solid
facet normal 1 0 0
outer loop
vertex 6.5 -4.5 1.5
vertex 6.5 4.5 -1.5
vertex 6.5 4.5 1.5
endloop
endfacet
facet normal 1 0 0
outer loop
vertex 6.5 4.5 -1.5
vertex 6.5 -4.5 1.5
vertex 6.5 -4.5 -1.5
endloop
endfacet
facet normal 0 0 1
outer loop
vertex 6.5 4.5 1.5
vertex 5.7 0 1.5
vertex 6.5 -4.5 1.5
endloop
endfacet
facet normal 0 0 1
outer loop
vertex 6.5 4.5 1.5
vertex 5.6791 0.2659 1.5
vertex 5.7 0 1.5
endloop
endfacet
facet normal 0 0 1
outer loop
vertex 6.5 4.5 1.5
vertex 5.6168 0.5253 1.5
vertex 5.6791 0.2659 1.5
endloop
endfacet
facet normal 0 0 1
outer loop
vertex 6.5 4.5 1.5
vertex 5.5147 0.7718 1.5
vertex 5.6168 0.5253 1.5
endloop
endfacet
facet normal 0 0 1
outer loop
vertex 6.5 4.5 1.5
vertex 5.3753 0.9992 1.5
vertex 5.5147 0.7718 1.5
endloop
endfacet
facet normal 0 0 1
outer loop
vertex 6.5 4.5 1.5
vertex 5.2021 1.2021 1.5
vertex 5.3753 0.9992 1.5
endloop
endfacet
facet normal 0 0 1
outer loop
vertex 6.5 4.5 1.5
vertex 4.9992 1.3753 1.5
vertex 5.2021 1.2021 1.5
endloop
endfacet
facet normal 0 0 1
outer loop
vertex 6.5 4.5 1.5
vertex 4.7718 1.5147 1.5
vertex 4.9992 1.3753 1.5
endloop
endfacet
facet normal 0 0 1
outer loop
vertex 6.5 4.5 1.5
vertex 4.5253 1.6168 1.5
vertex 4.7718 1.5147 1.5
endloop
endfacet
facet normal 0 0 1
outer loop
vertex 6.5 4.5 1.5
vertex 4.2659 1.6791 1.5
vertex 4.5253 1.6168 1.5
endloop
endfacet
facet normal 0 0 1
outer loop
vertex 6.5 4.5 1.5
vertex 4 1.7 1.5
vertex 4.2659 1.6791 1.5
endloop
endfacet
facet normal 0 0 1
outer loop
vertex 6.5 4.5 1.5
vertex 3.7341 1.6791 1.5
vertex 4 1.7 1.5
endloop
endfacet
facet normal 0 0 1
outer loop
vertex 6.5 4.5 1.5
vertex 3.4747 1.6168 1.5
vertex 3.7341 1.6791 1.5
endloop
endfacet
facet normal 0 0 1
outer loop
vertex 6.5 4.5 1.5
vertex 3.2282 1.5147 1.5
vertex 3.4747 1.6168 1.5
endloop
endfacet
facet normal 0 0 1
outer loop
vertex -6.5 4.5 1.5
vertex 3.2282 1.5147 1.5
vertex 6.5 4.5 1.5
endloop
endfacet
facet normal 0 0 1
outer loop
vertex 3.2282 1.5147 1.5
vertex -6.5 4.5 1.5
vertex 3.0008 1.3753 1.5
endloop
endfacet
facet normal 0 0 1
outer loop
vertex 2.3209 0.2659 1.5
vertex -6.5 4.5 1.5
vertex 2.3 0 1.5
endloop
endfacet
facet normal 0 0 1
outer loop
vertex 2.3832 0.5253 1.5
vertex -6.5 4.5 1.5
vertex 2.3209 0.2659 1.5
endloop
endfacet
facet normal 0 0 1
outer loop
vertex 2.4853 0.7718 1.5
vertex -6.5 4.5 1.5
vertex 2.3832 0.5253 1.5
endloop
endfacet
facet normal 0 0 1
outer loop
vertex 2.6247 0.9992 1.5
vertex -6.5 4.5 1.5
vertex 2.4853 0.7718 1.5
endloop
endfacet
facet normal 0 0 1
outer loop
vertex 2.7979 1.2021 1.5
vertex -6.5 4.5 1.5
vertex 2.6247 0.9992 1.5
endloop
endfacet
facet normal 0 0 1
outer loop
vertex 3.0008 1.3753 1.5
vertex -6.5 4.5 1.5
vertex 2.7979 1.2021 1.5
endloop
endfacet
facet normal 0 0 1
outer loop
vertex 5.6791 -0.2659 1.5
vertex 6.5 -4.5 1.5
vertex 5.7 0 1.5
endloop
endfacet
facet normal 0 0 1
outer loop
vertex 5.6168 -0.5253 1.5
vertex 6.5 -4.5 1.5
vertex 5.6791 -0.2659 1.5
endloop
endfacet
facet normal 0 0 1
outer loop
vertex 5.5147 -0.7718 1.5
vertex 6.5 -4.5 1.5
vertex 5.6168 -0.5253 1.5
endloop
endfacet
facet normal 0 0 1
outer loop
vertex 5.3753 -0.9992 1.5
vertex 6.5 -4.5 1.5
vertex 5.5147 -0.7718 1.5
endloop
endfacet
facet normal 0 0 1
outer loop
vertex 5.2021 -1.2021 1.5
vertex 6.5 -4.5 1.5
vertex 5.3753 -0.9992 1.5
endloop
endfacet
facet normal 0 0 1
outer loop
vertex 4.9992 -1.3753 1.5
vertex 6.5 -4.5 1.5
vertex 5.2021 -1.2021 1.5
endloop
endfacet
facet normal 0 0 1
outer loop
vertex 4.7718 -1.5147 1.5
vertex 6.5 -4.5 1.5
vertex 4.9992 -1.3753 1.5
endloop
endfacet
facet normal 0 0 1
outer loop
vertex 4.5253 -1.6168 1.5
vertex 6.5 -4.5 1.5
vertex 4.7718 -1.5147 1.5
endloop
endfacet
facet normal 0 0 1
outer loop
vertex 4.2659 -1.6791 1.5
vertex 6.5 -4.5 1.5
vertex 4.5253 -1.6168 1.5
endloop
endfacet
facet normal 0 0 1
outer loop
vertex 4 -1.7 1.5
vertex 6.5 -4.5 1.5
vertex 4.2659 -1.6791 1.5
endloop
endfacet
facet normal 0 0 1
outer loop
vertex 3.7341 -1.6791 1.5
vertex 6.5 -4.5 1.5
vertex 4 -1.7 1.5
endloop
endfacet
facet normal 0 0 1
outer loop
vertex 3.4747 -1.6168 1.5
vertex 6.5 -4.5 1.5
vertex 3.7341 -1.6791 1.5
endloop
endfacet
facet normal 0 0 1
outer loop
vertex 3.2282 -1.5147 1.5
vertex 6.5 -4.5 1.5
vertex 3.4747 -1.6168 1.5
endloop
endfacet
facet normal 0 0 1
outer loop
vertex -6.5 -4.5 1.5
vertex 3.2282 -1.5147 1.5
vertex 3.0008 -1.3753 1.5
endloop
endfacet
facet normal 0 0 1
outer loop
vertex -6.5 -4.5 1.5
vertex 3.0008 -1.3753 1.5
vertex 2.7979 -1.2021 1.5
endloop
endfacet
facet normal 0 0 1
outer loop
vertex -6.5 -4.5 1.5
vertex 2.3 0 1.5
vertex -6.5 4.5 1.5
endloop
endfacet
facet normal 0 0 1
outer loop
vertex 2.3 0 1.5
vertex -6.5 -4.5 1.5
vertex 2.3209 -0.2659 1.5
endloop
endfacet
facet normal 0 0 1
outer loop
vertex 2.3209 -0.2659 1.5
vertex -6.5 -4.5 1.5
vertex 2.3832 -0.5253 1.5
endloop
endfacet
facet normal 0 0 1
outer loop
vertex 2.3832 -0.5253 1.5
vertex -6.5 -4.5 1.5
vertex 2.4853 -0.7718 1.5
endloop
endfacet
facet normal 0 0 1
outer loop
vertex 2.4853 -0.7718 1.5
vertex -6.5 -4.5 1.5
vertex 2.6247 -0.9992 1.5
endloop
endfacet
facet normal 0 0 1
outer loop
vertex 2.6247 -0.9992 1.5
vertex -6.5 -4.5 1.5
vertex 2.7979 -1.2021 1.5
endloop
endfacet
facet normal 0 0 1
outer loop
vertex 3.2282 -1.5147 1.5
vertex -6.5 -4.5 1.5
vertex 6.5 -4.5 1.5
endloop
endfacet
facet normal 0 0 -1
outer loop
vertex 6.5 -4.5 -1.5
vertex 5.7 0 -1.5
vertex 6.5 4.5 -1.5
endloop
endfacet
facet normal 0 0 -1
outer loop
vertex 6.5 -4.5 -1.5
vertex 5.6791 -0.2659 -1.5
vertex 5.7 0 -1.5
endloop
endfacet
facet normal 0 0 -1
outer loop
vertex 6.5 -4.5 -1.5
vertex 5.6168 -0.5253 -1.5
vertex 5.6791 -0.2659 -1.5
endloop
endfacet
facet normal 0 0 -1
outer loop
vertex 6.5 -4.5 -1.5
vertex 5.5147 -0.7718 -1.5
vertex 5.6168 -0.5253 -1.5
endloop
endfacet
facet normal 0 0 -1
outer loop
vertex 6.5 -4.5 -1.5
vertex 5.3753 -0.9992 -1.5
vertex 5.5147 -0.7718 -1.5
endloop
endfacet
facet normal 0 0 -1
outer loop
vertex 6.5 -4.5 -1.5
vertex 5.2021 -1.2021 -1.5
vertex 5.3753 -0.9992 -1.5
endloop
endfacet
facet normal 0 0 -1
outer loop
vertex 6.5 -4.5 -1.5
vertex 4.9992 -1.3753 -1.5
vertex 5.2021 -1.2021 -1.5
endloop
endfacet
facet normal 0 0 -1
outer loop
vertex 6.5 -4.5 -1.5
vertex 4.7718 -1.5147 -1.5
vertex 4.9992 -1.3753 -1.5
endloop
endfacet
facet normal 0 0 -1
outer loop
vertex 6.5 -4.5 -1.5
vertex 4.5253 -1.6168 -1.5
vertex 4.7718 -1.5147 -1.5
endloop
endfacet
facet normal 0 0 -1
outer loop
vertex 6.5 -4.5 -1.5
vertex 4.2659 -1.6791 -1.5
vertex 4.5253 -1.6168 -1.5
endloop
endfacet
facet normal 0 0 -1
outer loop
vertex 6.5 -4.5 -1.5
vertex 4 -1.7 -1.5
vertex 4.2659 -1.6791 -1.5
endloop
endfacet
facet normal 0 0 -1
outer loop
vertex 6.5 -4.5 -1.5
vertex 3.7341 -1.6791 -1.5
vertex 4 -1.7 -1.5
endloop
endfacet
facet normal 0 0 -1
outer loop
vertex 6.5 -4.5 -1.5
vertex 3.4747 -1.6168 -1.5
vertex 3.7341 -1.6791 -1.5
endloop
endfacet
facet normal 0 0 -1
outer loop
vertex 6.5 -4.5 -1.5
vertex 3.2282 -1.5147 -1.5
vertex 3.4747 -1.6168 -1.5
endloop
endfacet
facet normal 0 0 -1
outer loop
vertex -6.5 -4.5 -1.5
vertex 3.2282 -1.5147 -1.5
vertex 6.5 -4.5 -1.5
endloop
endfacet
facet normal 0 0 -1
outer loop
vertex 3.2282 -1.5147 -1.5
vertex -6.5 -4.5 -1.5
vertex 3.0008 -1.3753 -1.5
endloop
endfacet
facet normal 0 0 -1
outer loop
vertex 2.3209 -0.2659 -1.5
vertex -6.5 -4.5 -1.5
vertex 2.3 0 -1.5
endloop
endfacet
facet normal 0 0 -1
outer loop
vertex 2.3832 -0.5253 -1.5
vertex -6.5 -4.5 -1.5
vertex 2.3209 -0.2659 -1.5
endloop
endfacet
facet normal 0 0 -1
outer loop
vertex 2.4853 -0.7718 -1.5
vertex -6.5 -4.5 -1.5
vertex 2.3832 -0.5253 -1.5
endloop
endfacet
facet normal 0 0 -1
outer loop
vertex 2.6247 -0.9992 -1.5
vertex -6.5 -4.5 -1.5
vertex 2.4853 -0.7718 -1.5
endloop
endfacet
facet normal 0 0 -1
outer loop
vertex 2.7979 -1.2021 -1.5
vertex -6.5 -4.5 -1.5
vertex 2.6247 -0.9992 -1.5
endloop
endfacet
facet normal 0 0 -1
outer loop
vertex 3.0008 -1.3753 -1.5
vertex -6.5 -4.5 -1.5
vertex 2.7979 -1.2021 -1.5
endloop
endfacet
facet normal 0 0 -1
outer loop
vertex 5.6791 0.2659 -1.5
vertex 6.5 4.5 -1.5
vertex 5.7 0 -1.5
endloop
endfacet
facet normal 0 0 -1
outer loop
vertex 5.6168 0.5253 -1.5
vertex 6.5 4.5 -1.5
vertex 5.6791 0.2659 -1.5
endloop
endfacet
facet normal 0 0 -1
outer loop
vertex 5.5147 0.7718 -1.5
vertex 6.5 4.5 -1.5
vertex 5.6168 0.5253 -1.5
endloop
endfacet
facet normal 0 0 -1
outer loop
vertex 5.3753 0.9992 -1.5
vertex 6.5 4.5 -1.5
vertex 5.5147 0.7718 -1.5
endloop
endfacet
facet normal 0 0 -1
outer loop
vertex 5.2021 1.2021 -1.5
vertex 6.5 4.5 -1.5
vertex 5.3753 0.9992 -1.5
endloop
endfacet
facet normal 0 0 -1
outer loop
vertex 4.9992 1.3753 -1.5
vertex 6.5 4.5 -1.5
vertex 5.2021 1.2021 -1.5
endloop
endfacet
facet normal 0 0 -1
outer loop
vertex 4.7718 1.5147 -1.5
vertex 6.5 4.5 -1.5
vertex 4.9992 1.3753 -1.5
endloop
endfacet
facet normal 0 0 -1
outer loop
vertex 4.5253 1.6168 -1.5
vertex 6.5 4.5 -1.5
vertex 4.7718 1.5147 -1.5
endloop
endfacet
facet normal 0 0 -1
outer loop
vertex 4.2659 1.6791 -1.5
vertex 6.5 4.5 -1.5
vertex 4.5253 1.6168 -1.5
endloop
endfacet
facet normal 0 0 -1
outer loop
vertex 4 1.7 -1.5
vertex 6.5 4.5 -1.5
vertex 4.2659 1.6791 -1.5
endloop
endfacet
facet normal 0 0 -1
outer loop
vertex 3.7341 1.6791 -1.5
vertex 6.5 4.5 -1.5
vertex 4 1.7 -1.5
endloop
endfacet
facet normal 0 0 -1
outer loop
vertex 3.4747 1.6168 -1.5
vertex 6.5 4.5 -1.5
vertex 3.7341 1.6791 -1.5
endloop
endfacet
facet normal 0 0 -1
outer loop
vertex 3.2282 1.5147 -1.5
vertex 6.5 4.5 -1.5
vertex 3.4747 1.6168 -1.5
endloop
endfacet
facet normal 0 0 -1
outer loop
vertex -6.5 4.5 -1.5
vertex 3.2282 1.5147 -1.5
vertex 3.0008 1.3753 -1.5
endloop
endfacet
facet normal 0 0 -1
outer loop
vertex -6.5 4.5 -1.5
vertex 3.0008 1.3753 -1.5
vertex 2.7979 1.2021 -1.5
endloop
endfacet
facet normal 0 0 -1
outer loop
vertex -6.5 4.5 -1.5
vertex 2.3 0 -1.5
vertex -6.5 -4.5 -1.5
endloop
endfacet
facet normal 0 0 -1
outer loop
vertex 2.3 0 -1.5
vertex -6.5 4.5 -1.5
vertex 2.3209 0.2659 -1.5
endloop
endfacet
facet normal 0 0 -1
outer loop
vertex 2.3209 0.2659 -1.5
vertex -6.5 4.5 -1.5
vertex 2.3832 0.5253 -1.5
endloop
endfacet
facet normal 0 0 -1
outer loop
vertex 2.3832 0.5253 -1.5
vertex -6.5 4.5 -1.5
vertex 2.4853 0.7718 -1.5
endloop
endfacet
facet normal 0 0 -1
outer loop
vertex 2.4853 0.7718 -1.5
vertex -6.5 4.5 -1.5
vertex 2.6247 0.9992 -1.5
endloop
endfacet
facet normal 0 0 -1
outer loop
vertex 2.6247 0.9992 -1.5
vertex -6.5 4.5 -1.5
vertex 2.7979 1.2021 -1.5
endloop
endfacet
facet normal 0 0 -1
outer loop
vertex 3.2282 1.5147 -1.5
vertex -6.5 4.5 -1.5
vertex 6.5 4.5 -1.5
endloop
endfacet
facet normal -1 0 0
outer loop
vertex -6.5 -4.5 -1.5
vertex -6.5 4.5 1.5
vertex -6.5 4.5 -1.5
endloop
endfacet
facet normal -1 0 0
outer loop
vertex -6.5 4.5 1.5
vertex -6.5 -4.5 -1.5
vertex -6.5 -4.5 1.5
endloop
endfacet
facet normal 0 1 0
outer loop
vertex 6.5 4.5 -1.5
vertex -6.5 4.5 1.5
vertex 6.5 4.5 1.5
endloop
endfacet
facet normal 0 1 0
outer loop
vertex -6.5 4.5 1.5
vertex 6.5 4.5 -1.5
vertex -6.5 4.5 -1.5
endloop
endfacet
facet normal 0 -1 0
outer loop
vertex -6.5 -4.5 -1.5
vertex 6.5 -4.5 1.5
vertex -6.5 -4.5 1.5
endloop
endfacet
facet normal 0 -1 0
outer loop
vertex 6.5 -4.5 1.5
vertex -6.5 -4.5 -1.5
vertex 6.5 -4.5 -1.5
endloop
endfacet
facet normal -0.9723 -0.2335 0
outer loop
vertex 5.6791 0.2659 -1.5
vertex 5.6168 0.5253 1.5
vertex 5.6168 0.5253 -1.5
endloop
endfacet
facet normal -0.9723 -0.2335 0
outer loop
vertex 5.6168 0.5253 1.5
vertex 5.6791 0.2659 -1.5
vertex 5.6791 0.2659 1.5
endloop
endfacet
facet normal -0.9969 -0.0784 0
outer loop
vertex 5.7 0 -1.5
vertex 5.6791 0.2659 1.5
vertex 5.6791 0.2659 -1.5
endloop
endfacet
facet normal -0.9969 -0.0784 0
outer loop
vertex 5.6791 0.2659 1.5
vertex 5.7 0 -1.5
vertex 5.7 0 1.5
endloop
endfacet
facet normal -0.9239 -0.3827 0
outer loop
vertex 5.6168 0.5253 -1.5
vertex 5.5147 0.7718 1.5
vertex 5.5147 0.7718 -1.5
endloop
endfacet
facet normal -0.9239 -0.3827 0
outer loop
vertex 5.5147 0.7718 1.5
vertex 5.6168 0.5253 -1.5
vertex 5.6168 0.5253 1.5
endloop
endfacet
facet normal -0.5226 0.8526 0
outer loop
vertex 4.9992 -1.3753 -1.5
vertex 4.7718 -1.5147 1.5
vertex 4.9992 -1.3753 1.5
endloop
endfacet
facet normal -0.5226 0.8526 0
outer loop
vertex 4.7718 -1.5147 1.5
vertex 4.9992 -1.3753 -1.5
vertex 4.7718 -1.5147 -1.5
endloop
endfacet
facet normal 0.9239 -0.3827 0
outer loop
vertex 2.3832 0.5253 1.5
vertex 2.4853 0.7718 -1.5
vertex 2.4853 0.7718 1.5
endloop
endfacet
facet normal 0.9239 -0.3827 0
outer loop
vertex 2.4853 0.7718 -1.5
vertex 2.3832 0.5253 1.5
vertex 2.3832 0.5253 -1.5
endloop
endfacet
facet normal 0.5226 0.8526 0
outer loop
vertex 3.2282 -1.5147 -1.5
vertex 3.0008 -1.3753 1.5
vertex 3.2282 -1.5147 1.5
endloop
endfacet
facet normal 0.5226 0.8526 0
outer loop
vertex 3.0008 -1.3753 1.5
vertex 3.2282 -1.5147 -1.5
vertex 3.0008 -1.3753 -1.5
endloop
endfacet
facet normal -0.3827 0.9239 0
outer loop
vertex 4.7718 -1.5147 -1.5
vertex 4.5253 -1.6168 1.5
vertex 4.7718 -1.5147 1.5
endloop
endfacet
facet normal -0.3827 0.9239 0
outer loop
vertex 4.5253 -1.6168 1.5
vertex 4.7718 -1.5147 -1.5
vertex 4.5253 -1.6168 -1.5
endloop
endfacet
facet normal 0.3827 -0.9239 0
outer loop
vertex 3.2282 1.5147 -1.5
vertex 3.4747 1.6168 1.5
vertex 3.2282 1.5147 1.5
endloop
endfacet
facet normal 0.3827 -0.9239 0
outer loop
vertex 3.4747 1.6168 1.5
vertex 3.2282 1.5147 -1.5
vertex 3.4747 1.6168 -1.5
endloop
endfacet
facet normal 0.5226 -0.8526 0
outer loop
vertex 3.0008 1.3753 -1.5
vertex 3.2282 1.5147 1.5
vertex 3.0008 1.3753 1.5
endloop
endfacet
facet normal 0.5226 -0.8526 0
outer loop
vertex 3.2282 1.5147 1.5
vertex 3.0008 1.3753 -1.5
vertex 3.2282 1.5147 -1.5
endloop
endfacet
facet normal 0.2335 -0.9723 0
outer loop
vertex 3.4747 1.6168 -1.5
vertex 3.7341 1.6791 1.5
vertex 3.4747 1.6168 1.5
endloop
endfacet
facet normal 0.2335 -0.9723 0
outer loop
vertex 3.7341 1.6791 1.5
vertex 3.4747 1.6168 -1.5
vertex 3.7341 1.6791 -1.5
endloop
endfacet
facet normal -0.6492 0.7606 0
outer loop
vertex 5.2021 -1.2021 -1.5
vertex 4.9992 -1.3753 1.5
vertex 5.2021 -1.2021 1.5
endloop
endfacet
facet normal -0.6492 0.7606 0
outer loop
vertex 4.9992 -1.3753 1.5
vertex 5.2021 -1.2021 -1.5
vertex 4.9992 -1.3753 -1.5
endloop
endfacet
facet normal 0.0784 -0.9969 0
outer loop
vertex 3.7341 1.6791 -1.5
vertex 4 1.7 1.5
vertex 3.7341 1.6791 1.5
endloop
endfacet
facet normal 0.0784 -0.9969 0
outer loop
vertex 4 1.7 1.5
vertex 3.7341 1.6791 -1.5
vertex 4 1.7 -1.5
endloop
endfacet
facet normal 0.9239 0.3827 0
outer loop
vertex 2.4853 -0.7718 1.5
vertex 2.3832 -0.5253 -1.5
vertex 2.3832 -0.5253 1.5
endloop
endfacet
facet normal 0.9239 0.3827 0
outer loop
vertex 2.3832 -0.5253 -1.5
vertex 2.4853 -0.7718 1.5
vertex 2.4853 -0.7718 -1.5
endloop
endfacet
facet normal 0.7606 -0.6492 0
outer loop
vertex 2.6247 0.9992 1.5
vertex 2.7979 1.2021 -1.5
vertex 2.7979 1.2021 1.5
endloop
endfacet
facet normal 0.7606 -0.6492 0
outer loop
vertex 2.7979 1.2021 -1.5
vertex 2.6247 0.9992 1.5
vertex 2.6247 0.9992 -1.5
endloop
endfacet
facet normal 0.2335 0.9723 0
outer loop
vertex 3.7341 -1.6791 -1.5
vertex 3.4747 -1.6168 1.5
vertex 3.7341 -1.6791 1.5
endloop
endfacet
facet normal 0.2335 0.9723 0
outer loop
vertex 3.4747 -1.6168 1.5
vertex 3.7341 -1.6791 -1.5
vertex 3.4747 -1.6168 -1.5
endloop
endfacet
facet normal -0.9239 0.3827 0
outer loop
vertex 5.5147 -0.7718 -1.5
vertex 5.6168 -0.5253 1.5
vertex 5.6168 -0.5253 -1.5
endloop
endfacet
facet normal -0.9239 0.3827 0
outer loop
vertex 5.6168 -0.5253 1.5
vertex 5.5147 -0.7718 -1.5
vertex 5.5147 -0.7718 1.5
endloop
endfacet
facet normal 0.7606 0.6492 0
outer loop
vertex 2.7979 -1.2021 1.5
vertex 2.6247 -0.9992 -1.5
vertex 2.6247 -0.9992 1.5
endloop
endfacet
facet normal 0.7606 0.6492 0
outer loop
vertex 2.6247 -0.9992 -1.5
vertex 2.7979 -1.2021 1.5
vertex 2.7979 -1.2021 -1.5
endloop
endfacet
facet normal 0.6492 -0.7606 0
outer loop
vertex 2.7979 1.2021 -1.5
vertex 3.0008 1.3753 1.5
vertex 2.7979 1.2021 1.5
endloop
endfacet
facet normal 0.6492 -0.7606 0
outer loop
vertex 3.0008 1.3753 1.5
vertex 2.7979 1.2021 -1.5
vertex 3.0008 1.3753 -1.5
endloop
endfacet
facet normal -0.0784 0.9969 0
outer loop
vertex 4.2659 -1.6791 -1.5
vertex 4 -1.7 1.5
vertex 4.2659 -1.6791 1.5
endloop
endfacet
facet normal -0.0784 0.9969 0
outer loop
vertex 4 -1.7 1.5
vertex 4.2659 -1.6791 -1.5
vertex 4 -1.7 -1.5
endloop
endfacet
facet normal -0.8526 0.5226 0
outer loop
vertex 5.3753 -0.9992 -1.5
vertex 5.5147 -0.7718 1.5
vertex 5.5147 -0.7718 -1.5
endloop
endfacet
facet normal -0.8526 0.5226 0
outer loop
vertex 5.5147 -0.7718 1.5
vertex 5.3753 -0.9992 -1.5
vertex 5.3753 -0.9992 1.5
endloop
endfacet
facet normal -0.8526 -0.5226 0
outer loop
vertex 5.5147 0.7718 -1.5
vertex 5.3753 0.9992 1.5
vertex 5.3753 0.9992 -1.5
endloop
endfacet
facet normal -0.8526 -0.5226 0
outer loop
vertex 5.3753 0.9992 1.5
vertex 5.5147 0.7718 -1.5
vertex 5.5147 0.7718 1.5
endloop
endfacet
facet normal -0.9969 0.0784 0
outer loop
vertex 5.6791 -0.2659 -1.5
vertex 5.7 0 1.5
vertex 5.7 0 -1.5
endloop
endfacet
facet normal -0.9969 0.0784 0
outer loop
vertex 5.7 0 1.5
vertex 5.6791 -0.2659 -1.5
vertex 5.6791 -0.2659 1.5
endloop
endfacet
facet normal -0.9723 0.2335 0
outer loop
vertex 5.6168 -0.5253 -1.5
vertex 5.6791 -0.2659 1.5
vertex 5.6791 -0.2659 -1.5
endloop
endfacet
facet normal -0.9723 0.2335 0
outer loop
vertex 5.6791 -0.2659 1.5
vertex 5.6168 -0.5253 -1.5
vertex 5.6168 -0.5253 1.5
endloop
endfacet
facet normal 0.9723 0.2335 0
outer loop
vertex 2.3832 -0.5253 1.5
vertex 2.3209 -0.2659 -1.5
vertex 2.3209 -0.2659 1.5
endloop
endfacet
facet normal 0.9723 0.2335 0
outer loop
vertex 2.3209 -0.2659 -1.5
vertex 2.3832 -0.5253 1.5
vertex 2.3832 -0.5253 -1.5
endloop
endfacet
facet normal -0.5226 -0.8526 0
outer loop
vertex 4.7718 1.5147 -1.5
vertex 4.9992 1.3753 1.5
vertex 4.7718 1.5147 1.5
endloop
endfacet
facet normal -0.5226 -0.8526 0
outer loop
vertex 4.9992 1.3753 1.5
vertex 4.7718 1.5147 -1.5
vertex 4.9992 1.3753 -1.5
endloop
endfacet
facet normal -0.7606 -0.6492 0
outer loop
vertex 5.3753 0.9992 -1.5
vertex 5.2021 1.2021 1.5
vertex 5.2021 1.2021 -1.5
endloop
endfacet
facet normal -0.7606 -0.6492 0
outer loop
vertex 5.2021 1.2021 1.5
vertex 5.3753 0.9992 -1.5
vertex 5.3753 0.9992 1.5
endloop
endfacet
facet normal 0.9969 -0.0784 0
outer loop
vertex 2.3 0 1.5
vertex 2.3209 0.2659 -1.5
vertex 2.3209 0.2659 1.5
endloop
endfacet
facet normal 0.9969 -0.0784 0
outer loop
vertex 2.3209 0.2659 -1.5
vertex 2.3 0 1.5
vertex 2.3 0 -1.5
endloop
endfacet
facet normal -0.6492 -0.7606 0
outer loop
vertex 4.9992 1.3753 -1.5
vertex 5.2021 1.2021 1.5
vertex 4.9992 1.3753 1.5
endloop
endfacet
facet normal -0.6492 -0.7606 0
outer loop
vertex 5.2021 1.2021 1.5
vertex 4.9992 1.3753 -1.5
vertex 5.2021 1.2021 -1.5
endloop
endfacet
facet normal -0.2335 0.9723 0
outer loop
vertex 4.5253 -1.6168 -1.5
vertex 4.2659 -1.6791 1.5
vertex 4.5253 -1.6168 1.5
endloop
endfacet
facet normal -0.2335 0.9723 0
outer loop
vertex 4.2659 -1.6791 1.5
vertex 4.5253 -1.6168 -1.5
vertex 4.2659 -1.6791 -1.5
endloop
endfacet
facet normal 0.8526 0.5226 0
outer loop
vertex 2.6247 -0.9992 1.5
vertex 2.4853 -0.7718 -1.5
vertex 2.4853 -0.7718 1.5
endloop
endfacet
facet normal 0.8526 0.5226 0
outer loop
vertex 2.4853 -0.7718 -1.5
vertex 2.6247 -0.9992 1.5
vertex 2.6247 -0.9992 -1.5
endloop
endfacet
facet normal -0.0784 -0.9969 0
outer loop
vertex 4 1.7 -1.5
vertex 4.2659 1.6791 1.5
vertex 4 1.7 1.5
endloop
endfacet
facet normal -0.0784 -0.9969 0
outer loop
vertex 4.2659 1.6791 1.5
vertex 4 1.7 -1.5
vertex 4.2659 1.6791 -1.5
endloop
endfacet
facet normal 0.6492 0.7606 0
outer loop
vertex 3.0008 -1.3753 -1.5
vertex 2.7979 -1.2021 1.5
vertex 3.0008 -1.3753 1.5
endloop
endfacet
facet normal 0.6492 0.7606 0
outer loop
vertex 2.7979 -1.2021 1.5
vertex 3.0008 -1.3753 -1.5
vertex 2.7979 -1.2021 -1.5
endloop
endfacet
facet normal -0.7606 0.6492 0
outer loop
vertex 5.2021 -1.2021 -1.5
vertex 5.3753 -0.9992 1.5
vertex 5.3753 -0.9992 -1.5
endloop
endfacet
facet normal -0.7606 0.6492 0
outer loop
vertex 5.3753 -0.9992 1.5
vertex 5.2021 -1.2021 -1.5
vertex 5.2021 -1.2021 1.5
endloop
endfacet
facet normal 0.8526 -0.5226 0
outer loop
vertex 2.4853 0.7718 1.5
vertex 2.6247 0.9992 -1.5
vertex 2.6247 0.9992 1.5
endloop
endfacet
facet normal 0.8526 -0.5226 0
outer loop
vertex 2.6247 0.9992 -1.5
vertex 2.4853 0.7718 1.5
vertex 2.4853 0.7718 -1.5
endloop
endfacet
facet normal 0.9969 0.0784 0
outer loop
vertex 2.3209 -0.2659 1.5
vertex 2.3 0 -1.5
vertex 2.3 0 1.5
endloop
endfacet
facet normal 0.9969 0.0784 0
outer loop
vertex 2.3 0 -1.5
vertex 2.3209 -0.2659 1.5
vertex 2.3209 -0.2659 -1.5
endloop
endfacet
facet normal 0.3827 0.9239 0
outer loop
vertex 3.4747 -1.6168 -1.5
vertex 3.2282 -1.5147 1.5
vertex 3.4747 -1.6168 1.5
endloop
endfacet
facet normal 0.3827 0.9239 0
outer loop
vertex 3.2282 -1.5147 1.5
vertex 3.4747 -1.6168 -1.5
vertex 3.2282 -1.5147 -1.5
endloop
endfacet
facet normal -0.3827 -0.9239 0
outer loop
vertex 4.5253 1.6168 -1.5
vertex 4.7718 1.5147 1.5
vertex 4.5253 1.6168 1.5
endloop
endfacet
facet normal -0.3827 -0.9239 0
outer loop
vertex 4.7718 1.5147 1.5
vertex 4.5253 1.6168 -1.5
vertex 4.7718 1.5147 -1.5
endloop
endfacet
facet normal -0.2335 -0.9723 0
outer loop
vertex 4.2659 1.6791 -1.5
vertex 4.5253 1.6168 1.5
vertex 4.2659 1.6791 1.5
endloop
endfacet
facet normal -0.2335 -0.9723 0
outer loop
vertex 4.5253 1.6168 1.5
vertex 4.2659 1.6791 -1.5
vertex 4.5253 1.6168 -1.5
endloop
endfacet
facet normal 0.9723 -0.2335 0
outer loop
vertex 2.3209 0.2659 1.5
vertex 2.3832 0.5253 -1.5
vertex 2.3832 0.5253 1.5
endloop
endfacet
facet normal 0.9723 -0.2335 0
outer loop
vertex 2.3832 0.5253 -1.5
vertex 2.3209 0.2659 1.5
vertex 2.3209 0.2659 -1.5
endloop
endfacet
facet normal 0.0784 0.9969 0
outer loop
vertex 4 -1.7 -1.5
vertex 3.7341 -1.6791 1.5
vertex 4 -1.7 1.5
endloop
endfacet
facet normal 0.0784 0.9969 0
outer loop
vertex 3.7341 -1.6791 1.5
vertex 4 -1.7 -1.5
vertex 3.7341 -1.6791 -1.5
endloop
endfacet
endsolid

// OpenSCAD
$fn=40;
module step_motor_fastener (){
	difference(){
		cube([13, 9, 3],center=true);
		translate([4,0,-3]) cylinder(r=1.7, h=8);
	}
}

step_motor_fastener() ;
